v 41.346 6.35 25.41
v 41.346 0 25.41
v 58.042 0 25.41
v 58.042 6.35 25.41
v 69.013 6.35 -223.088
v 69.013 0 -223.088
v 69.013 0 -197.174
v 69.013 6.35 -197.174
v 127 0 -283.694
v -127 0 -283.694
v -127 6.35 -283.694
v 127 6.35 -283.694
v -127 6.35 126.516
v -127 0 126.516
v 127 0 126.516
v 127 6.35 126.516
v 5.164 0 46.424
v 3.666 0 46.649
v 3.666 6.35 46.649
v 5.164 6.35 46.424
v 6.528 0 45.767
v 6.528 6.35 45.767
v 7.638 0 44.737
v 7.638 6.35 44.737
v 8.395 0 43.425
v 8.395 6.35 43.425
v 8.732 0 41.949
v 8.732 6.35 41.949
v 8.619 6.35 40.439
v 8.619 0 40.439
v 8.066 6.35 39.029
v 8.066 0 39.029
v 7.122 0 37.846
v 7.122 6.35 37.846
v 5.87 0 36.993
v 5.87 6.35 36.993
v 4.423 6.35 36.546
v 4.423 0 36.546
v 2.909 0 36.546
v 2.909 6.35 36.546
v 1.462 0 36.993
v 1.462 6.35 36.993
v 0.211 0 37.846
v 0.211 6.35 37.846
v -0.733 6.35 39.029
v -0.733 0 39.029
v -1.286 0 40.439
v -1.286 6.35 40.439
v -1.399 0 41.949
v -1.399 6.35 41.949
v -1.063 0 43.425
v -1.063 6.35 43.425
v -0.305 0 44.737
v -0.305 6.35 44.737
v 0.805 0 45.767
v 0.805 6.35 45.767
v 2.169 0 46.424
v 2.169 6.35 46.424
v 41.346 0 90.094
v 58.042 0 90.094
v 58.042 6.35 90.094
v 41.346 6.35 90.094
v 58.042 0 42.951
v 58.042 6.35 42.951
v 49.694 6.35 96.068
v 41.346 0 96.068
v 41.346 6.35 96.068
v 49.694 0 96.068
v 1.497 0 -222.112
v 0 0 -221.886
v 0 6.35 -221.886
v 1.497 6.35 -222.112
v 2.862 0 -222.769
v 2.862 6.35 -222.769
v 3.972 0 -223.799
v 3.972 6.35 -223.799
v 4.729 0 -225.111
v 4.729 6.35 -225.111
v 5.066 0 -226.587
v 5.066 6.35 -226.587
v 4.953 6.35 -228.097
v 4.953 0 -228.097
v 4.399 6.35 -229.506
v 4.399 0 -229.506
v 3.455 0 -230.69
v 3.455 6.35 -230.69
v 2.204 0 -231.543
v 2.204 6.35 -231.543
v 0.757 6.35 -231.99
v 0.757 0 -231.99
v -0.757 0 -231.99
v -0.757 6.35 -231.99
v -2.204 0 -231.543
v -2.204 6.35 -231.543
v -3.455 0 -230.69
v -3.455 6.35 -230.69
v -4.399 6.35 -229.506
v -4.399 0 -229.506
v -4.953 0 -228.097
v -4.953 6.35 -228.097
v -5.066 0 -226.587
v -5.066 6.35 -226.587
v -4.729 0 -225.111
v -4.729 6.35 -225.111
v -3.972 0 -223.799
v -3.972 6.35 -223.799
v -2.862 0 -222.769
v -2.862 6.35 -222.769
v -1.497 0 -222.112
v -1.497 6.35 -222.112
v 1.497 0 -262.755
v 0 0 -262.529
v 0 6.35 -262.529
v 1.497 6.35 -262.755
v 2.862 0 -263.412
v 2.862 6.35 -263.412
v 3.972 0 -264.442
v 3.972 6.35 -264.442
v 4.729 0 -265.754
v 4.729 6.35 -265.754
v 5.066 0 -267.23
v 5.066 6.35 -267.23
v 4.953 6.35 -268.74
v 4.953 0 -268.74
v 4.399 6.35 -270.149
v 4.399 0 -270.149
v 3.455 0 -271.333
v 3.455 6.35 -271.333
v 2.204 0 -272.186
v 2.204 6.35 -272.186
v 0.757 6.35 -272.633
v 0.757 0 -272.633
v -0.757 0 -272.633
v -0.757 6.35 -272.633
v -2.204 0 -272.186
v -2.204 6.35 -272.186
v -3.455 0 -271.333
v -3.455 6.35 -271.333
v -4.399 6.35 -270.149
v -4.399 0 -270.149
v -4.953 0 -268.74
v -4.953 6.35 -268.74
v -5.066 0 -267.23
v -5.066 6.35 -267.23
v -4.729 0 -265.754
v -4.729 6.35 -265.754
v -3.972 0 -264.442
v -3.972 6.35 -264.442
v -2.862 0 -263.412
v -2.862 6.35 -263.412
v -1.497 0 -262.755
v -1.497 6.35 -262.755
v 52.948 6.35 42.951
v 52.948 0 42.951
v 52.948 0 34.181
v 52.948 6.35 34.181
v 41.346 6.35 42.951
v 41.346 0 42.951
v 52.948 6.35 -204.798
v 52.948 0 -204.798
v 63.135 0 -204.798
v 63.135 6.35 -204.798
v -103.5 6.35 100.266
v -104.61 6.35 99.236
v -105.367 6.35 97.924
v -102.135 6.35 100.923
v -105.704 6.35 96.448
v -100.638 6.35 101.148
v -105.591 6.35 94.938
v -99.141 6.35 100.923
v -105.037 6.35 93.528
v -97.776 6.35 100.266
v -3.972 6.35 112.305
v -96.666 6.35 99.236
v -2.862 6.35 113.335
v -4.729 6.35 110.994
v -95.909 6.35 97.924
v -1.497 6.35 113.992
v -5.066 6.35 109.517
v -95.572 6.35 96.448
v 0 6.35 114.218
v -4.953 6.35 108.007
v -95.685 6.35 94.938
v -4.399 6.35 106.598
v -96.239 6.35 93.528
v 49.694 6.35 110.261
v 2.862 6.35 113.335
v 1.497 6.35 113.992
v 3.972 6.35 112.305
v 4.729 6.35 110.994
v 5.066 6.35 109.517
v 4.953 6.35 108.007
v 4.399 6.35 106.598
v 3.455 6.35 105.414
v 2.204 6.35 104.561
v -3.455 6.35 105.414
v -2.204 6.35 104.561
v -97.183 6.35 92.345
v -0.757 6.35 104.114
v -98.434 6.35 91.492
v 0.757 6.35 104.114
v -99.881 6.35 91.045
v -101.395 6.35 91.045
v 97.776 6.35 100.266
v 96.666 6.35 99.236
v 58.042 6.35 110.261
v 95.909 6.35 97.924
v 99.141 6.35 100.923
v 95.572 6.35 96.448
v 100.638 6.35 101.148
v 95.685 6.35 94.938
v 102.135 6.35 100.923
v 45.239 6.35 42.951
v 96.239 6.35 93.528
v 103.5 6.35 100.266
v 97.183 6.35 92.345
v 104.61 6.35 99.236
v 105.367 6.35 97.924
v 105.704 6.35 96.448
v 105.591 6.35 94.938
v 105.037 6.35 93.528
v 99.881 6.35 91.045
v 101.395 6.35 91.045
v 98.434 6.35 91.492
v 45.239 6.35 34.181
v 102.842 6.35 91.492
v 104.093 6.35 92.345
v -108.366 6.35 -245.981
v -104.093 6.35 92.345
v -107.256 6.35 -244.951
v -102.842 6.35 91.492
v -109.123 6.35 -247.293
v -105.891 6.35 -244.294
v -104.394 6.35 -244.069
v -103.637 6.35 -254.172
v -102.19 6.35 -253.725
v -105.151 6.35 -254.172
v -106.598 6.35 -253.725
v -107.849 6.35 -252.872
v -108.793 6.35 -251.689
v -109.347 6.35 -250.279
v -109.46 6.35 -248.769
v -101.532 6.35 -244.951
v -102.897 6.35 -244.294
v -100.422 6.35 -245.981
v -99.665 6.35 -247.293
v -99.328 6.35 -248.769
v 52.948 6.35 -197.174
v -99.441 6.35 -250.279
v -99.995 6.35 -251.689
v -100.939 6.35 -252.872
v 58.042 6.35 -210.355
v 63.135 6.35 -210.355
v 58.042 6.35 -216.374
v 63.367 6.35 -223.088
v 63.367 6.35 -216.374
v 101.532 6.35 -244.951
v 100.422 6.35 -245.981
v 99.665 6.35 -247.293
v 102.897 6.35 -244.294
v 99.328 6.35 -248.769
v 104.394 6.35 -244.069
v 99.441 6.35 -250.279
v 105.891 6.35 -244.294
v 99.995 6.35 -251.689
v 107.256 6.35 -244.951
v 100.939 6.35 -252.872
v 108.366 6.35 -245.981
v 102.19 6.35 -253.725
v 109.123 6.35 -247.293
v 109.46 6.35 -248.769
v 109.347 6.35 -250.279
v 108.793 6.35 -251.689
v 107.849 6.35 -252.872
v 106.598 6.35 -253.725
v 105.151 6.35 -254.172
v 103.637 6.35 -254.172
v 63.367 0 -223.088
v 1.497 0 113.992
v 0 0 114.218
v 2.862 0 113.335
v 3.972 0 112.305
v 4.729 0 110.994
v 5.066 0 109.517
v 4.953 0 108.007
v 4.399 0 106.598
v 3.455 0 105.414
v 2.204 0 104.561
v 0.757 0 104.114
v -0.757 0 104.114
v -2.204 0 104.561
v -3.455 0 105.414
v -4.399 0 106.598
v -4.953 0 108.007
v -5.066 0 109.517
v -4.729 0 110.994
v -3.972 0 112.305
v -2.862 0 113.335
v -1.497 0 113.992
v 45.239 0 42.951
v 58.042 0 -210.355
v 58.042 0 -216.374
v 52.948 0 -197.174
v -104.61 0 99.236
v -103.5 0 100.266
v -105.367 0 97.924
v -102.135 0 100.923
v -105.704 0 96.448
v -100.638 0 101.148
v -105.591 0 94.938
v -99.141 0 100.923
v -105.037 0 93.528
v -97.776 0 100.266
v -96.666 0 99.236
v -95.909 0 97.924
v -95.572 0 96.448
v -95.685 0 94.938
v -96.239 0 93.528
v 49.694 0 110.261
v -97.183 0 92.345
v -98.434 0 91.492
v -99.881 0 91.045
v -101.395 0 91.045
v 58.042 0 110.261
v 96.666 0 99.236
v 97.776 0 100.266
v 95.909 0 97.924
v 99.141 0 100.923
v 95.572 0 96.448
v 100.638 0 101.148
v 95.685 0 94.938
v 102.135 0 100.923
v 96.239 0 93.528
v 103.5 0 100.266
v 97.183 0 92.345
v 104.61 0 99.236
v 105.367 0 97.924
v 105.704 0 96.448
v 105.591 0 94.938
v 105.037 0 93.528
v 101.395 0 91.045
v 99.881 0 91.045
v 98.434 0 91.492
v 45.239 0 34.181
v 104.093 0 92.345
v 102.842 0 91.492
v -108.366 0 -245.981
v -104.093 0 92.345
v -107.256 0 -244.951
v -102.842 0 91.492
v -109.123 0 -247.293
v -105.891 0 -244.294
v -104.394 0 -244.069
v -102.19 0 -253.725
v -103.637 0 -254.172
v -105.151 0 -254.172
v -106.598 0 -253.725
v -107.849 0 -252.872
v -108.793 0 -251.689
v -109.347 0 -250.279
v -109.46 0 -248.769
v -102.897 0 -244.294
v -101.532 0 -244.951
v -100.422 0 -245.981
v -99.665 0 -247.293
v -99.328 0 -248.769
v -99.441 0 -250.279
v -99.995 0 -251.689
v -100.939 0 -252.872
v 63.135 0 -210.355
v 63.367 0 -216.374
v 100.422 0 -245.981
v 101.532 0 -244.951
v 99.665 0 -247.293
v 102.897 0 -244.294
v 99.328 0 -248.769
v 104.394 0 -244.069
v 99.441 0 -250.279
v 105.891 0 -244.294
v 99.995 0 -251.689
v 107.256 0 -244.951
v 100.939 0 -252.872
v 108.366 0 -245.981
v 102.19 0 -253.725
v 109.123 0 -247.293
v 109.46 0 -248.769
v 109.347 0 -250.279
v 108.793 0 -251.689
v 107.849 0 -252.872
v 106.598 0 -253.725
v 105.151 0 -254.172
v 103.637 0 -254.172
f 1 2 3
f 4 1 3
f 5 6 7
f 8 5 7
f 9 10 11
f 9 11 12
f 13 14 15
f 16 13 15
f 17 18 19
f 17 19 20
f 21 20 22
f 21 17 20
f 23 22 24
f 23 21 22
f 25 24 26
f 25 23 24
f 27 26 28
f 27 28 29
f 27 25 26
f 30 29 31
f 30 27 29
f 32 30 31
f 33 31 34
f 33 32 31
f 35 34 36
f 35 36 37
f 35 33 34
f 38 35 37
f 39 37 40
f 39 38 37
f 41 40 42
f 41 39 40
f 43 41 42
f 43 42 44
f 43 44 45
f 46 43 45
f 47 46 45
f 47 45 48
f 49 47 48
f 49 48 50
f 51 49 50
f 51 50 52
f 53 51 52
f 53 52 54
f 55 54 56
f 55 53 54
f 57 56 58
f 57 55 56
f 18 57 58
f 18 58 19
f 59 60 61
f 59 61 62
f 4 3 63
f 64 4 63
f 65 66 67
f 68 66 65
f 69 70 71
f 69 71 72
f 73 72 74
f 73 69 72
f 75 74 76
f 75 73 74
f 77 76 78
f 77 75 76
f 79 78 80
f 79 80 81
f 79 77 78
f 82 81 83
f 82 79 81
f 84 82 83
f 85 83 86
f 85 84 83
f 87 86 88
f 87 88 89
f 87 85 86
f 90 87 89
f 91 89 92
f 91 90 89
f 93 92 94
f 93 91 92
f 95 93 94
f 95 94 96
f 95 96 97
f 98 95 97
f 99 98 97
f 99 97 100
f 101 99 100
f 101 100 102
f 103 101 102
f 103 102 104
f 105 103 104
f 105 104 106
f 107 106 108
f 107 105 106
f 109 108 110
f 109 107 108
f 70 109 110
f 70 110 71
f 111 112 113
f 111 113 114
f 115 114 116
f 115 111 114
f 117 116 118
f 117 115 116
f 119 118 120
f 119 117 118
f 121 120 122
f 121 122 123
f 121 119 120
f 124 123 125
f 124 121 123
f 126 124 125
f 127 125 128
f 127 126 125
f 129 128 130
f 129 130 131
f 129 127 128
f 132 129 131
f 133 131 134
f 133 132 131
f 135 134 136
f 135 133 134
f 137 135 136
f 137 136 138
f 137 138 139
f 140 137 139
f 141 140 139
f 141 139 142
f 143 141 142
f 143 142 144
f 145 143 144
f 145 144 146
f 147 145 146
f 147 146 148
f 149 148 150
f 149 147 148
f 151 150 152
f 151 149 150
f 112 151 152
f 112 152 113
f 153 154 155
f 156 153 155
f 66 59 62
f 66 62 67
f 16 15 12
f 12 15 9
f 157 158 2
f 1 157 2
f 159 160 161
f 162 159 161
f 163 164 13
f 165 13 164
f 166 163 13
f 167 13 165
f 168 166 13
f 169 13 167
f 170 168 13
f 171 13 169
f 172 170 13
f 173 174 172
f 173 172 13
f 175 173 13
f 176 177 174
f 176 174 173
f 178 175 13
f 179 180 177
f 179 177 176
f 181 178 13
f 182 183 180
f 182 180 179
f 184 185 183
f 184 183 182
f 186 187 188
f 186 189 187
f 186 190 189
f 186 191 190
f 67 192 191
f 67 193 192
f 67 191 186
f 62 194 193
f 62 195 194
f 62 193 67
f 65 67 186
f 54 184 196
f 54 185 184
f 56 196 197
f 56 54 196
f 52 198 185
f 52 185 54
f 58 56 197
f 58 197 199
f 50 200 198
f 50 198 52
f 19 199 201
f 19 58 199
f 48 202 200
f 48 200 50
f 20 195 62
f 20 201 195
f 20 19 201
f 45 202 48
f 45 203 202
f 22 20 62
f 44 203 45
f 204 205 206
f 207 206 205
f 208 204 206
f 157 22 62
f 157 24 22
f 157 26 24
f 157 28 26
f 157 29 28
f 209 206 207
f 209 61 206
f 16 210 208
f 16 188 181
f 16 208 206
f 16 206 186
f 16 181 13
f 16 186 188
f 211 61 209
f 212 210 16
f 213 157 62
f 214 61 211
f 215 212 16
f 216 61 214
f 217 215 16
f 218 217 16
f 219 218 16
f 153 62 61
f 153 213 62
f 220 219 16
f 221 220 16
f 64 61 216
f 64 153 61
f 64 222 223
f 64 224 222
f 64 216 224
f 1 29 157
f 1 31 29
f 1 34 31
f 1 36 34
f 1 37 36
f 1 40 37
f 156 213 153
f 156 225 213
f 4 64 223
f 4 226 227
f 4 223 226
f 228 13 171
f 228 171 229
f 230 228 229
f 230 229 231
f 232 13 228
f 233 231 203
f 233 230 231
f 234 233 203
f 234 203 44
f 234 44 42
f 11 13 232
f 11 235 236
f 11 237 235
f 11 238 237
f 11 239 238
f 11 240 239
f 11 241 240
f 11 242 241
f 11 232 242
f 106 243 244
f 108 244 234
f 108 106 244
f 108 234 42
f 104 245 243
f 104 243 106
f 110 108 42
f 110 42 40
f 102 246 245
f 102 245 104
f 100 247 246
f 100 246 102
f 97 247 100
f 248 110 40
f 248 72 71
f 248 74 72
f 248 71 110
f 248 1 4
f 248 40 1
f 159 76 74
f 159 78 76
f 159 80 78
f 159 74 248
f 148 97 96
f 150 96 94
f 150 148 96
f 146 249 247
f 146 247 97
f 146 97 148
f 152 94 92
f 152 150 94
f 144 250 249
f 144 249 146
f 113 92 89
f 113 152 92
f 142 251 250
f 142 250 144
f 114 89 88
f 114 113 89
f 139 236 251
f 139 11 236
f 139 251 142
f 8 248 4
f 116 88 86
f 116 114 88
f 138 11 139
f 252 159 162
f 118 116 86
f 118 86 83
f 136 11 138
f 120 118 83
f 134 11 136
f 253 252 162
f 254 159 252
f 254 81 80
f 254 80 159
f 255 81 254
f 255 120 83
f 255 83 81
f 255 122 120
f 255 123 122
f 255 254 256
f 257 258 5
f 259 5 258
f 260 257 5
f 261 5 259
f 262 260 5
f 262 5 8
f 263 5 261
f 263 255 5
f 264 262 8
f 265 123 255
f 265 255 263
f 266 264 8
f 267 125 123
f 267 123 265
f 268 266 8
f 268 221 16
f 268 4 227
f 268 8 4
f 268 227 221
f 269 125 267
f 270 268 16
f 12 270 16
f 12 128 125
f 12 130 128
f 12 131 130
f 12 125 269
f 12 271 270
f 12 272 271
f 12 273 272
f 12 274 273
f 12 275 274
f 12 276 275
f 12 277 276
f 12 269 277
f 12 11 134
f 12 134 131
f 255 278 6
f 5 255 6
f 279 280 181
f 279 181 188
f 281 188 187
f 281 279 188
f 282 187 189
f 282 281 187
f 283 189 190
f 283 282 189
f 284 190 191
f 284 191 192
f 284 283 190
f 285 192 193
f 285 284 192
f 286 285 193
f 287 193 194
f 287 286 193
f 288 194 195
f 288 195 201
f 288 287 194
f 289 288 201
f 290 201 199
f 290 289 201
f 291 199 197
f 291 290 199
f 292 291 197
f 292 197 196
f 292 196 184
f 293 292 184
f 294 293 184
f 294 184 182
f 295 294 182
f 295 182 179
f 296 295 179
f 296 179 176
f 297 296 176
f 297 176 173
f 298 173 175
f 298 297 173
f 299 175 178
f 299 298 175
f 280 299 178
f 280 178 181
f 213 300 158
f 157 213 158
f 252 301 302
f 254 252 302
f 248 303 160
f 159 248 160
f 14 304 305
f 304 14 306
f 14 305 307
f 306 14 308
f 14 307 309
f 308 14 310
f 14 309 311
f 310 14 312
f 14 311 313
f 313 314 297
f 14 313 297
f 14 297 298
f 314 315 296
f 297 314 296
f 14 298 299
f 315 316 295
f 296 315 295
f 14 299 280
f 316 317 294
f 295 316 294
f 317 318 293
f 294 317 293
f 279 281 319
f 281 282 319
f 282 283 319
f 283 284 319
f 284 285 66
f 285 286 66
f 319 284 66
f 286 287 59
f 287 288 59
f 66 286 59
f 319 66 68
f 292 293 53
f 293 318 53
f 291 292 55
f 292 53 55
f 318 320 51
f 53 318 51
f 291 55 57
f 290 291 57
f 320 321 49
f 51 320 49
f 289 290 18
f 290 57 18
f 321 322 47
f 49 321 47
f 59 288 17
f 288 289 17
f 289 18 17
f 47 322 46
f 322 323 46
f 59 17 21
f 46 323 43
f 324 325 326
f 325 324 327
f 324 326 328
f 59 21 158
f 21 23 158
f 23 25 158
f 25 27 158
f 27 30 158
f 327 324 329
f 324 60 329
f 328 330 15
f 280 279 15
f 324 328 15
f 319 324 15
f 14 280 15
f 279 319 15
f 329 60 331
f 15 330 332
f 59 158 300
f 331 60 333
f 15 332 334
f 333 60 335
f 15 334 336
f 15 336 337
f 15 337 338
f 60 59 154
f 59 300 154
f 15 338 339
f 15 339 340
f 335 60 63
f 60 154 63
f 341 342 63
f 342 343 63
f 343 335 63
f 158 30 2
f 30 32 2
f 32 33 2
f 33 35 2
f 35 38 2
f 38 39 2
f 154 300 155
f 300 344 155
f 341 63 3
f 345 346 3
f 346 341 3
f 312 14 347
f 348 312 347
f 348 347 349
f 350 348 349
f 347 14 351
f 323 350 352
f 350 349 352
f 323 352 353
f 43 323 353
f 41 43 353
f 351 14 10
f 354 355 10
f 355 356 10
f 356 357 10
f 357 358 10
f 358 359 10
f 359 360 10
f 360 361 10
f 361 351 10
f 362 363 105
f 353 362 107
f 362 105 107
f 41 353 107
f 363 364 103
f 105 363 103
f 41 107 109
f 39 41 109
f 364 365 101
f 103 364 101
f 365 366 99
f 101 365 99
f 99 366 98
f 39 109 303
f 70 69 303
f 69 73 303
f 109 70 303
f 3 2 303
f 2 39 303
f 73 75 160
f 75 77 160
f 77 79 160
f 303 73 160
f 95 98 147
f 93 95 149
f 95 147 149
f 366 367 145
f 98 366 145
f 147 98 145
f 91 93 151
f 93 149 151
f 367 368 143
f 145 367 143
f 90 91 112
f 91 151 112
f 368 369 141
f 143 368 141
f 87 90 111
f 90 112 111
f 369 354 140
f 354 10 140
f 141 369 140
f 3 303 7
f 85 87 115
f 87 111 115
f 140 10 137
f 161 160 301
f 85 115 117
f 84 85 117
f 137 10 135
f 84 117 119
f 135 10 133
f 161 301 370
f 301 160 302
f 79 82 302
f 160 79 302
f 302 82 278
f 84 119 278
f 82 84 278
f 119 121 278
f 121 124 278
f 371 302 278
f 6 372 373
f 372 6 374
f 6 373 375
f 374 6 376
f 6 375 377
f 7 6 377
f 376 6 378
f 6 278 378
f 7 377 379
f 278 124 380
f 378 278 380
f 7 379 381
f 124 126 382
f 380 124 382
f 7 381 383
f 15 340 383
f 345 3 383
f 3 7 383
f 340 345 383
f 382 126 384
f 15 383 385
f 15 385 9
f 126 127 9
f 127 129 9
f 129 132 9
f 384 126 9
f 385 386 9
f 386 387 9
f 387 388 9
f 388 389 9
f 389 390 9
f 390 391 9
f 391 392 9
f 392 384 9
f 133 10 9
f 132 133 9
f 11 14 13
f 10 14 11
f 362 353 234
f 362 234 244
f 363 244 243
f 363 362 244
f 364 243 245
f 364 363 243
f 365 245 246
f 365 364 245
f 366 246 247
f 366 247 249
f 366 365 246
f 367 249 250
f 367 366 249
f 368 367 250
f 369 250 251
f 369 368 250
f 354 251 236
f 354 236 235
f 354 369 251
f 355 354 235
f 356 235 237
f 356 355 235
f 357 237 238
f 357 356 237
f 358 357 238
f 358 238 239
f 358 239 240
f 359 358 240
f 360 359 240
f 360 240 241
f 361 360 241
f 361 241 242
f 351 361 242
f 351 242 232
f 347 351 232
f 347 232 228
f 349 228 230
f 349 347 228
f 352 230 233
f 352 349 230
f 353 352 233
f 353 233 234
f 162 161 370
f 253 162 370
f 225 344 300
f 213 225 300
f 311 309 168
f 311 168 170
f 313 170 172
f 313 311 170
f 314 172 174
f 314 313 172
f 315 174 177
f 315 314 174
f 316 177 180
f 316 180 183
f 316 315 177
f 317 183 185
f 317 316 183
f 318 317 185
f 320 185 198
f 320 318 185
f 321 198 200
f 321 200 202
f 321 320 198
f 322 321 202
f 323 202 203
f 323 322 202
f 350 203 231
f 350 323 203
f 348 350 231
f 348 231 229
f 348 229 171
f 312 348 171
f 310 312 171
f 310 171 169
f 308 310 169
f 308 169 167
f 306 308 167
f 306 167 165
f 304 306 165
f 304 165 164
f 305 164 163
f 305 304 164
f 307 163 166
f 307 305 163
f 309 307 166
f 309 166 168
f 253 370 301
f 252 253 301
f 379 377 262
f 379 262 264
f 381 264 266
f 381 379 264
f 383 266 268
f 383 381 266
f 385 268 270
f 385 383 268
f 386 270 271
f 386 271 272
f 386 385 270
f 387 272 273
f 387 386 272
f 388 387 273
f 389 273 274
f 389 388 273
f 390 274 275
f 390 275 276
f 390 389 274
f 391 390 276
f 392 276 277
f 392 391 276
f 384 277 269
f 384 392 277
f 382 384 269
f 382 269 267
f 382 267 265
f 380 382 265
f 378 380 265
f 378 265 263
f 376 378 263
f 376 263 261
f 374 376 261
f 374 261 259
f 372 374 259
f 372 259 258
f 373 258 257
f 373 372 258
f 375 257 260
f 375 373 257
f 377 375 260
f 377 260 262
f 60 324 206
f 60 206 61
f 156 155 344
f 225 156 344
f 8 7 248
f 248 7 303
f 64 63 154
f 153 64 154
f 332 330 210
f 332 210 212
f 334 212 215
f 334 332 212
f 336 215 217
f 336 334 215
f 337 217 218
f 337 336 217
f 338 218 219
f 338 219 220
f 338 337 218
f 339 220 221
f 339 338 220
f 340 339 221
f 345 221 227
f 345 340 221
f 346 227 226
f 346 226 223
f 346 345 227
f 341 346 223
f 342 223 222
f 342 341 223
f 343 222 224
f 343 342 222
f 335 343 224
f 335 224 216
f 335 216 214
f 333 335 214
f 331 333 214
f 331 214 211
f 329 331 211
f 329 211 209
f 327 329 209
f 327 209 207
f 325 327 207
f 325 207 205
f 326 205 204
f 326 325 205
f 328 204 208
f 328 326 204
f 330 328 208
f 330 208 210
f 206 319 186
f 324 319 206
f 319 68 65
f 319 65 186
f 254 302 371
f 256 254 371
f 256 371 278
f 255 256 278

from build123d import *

# Parameters (mm, degrees)
SKETCH1_W           = 254
SKETCH1_H           = 410.21
SKETCH1_R           = 5.08
BOSS_EXTRUDE1_DEPTH = 6.35


with BuildPart() as part:
    # Sketch1 → Boss-Extrude1 (new body)
    with BuildSketch(Plane(origin=(0, 0, 0), x_dir=(1, 0, 0), z_dir=(0, 1, 0))):
        with Locations((0, 78.589199082)):
            Rectangle(SKETCH1_W, SKETCH1_H)
        with Locations(Location((-100.6380512, -96.068481922, 0), (0, 0, 270))):
            Circle(SKETCH1_R, mode=Mode.SUBTRACT)
        with Locations(Location((100.6380512, -96.068481922, 0), (0, 0, 270))):
            Circle(SKETCH1_R, mode=Mode.SUBTRACT)
        with Locations(Location((0, 226.966451634, 0), (0, 0, 270))):
            Circle(SKETCH1_R, mode=Mode.SUBTRACT)
        with Locations(Location((0, 267.609461393, 0), (0, 0, 270))):
            Circle(SKETCH1_R, mode=Mode.SUBTRACT)
        with Locations(Location((-104.394, 249.148548959, 0), (0, 0, 270))):
            Circle(SKETCH1_R, mode=Mode.SUBTRACT)
        with Locations(Location((104.394, 249.148548959, 0), (0, 0, 270))):
            Circle(SKETCH1_R, mode=Mode.SUBTRACT)
        with Locations(Location((3.666326597, -41.569496857, 0), (0, 0, 270))):
            Circle(SKETCH1_R, mode=Mode.SUBTRACT)
        with Locations(Location((0, -109.13772467, 0), (0, 0, 270))):
            Circle(SKETCH1_R, mode=Mode.SUBTRACT)
        Polygon((69.012885603, 197.173617012), (52.948455079, 197.173617012), (52.948455079, 204.798194528), (63.135298998, 204.798194528), (63.135298998, 210.354654847), (58.041877039, 210.354654847), (58.041877039, 216.374153526), (63.366818178, 216.374153526), (63.366818178, 223.088209746), (69.012885603, 223.088209746), align=None, mode=Mode.SUBTRACT)
        Polygon((41.345742309, -42.951444708), (41.345742309, -25.410434465), (58.041877039, -25.410434465), (58.041877039, -42.951444708), (52.948455079, -42.951444708), (52.948455079, -34.180939586), (45.23941523, -34.180939586), (45.23941523, -42.951444708), align=None, mode=Mode.SUBTRACT)
        Polygon((58.041877039, -110.261456825), (58.041877039, -90.093932087), (41.345742309, -90.093932087), (41.345742309, -96.068481922), (49.693809674, -96.068481922), (49.693809674, -110.261456825), align=None, mode=Mode.SUBTRACT)
    extrude(amount=BOSS_EXTRUDE1_DEPTH)


solid = part.part
